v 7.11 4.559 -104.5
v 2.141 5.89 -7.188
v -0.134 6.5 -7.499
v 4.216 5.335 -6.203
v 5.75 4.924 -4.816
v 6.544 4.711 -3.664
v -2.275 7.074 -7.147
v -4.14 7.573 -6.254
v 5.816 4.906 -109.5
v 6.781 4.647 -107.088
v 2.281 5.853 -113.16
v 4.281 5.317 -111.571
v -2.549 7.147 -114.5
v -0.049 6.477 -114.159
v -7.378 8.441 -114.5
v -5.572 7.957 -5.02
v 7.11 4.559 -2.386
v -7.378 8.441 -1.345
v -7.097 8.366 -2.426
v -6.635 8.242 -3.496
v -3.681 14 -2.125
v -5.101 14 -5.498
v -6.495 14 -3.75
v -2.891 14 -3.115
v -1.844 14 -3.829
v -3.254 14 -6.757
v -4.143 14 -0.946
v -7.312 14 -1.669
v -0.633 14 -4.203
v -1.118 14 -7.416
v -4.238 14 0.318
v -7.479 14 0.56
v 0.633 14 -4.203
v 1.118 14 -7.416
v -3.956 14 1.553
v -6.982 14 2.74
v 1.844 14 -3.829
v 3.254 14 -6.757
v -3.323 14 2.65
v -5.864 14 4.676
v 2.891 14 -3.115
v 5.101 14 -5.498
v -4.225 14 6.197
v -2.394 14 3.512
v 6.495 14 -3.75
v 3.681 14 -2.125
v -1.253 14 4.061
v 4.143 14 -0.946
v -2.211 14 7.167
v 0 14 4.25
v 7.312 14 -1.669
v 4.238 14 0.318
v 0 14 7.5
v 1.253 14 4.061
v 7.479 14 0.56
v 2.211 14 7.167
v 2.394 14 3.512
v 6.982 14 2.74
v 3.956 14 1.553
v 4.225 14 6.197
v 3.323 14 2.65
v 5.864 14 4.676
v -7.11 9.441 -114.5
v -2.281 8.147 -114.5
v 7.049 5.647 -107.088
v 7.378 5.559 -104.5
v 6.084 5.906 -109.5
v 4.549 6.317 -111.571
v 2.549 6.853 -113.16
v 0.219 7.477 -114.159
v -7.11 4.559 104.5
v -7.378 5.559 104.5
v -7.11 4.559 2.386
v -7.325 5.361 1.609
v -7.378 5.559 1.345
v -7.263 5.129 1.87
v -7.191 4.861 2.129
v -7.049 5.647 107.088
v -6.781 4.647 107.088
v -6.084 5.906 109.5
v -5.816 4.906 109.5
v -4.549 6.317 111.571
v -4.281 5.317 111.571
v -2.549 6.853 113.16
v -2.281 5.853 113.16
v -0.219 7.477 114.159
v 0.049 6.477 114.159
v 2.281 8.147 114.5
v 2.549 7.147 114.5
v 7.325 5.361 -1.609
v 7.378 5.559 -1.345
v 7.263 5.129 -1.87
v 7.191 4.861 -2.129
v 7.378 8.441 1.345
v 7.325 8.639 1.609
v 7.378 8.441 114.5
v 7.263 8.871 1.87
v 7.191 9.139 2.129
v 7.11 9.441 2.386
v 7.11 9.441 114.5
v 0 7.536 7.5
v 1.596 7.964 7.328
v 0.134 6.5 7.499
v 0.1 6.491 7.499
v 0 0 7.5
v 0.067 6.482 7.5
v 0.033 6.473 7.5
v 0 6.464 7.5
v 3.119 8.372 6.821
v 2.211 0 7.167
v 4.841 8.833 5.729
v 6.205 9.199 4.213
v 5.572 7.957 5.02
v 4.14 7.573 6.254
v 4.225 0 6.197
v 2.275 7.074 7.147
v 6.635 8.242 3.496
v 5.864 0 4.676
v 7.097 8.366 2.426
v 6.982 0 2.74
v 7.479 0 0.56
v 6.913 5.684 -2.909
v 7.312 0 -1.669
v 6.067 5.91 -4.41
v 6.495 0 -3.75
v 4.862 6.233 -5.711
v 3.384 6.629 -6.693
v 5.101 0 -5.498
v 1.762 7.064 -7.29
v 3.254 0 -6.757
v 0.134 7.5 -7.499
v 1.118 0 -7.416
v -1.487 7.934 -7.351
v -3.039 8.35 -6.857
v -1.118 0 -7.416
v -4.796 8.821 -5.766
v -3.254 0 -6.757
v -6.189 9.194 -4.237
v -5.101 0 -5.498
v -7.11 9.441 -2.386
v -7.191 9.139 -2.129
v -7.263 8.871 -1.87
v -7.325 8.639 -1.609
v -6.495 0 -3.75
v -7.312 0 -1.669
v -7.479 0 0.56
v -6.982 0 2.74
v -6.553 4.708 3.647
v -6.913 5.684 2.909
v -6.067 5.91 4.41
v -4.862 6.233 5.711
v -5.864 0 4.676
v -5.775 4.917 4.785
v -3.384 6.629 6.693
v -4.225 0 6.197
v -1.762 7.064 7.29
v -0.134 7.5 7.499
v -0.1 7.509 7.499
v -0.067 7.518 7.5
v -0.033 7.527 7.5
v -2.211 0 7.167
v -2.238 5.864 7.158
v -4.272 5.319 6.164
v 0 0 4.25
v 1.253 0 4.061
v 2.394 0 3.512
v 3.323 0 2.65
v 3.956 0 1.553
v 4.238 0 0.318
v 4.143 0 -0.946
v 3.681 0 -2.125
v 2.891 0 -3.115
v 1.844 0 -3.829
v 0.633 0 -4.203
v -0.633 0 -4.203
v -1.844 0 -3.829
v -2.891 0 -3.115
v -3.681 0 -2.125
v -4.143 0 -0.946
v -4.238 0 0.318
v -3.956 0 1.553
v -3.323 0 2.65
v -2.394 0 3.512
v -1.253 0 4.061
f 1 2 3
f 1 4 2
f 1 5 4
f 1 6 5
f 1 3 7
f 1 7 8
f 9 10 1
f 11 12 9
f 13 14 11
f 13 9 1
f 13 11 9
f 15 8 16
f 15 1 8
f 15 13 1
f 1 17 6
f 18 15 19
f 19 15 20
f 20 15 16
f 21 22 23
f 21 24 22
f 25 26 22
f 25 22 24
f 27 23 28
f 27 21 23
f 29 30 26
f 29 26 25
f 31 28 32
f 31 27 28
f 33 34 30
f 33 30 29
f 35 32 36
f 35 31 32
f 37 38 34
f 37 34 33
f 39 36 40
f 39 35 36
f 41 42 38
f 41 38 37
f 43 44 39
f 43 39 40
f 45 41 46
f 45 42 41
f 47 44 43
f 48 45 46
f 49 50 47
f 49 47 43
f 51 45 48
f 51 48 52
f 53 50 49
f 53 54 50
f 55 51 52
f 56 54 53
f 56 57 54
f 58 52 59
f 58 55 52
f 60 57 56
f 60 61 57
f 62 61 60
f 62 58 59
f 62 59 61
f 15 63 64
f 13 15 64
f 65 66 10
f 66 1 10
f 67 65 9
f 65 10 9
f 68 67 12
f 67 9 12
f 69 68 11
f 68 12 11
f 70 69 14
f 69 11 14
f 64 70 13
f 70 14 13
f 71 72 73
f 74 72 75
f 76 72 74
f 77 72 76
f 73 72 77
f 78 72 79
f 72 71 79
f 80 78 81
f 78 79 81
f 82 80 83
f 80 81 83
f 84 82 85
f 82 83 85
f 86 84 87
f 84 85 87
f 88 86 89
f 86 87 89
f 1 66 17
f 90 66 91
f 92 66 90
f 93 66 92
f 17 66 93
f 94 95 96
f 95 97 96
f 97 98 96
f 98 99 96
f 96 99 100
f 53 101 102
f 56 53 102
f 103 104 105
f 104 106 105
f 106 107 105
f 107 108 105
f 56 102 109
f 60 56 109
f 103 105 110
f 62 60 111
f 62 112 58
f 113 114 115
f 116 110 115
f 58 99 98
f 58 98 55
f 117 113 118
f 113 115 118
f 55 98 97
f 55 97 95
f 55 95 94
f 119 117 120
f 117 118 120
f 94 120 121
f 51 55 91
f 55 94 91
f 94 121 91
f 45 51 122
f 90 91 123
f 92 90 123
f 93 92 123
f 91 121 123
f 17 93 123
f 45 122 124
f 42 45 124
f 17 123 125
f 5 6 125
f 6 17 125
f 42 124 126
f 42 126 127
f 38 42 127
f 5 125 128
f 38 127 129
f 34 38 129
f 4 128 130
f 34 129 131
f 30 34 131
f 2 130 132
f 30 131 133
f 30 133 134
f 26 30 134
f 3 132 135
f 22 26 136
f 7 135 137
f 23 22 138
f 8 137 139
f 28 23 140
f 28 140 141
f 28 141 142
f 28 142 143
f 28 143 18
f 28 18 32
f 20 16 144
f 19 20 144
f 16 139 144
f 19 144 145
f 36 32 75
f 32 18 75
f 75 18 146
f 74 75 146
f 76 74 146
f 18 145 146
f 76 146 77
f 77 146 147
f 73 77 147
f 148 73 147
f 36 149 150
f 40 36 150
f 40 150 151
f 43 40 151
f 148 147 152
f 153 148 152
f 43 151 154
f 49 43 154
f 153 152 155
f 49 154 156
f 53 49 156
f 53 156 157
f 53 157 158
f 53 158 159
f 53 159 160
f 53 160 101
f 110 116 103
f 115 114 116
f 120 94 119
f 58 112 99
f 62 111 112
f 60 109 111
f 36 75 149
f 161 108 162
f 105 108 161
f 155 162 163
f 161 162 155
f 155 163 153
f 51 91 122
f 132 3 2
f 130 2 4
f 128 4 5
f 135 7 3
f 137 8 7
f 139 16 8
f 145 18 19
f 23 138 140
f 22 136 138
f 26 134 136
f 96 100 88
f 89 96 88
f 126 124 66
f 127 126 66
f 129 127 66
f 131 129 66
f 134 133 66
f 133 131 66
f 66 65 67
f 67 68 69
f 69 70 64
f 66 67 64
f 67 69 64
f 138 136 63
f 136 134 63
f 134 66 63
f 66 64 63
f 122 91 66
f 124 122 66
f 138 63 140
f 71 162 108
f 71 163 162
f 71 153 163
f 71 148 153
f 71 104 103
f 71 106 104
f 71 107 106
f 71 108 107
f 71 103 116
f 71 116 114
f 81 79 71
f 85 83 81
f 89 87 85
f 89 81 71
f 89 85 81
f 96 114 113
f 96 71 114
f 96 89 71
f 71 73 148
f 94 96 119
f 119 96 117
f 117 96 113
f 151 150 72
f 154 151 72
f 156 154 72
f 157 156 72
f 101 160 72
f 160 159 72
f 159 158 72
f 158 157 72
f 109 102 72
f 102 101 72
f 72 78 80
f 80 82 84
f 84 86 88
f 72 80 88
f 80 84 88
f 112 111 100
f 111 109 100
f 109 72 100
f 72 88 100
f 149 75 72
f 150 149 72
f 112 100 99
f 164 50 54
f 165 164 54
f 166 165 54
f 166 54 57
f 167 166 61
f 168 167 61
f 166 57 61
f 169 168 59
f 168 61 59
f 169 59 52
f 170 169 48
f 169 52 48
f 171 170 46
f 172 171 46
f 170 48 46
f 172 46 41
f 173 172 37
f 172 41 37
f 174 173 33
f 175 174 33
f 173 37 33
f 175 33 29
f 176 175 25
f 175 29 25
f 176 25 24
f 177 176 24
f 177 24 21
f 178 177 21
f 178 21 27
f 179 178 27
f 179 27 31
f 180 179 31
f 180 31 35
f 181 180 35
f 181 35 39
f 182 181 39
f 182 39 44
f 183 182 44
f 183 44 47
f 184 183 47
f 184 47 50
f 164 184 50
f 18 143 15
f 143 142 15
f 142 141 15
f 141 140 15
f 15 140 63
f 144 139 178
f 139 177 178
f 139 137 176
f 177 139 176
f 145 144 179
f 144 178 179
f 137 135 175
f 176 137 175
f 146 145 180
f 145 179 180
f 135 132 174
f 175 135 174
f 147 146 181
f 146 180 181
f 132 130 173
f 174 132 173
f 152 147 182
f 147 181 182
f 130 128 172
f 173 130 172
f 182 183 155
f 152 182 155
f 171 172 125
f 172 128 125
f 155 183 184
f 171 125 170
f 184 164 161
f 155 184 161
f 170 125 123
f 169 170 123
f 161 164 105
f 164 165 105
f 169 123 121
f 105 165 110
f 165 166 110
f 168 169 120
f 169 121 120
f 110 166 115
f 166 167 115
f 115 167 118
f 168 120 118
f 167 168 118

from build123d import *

# Parameters (mm, degrees)
SKETCH1_R           = 7.5
BOSS_EXTRUDE2_DEPTH = 14
CUT_EXTRUDE1_REACH  = 19.564
SKETCH2_R           = 4.25
BOSS_EXTRUDE3_START = -7.279118874
BOSS_EXTRUDE3_DEPTH = 1.03527618
FILLET1_R           = 10
CIRPATTERN1_COUNT   = 2
FILLET3_R           = 10


with BuildPart() as part:
    # Sketch1 → Boss-Extrude2 (new body)
    with BuildSketch(Plane(origin=(0, 0, 0), x_dir=(1, 0, 0), z_dir=(0, 1, 0))):
        with Locations(Location((0, 0, 0), (0, 0, 270))):
            Circle(SKETCH1_R)
    extrude(amount=BOSS_EXTRUDE2_DEPTH)

    # Sketch2 → Cut-Extrude1 (cut, up to next)
    with BuildSketch(Plane(origin=(0, 14, 0), x_dir=(1, 0, 0), z_dir=(0, 1, 0)), mode=Mode.PRIVATE) as cut_extrude1_sk1:
        with Locations(Location((0, 0, 0), (0, 0, 270))):
            Circle(SKETCH2_R)
    cut_extrude1_tool1 = extrude(cut_extrude1_sk1.sketch, amount=-CUT_EXTRUDE1_REACH, mode=Mode.PRIVATE) & part.part
    add(cut_extrude1_tool1.solids().sort_by_distance((0, 14, 0))[0], mode=Mode.SUBTRACT)

    # Boss-Extrude3: read off the stored shape, not the designer's step
    # Boss-Extrude3 outline → Boss-Extrude3 (add)
    with BuildSketch(Plane(origin=(0, 0, 0), x_dir=(0.9659258262890672, 0.2588190451025251, 0), z_dir=(0.25881904510252507, -0.9659258262890672, 0)).offset(BOSS_EXTRUDE3_START)):
        with BuildLine():
            add(Edge.make_bspline(
                [(-5.688266684, 1.344969698), (-4.547659305, 7.389056985), (1.811733316, 7.498803292)],
                knots=[0.18030465, 0.18030465, 0.18030465, 1.551469461, 1.551469461, 1.551469461], degree=2, weights=[1, 0.771122328, 0.993637519]))
            add(Edge.make_bspline(
                [(1.811733316, 7.498803292), (8.171125936, 7.389056985), (9.311733316, 1.344969698)],
                knots=[1.590123193, 1.590123193, 1.590123193, 2.961288004, 2.961288004, 2.961288004], degree=2, weights=[0.993637519, 0.771122328, 1]))
            Line((9.311733316, 1.344969698), (9.311733316, 114.5))
            Line((9.311733316, 114.5), (-5.688266684, 114.5))
            Line((-5.688266684, 114.5), (-5.688266684, 1.344969698))
        make_face()
    boss_extrude3 = extrude(amount=BOSS_EXTRUDE3_DEPTH)

    # Fillet1
    fillet1_edges = [part.edges().sort_by_distance(p)[0] for p in [
        (-7.244443697, 5.058857162, 114.5),
    ]]
    fillet(fillet1_edges, radius=FILLET1_R)

    # CirPattern1: Boss-Extrude3 ×2 about axis
    cirpattern1_axis = Axis((0, 0, 0), (0, 1, 0))
    for i in range(1, CIRPATTERN1_COUNT):
        add(boss_extrude3.rotate(cirpattern1_axis, i * 360 / CIRPATTERN1_COUNT))

    # Fillet3
    fillet3_edges = [part.edges().sort_by_distance(p)[0] for p in [
        (7.244443697, 5.058857162, -114.5),
    ]]
    fillet(fillet3_edges, radius=FILLET3_R)


solid = part.part
